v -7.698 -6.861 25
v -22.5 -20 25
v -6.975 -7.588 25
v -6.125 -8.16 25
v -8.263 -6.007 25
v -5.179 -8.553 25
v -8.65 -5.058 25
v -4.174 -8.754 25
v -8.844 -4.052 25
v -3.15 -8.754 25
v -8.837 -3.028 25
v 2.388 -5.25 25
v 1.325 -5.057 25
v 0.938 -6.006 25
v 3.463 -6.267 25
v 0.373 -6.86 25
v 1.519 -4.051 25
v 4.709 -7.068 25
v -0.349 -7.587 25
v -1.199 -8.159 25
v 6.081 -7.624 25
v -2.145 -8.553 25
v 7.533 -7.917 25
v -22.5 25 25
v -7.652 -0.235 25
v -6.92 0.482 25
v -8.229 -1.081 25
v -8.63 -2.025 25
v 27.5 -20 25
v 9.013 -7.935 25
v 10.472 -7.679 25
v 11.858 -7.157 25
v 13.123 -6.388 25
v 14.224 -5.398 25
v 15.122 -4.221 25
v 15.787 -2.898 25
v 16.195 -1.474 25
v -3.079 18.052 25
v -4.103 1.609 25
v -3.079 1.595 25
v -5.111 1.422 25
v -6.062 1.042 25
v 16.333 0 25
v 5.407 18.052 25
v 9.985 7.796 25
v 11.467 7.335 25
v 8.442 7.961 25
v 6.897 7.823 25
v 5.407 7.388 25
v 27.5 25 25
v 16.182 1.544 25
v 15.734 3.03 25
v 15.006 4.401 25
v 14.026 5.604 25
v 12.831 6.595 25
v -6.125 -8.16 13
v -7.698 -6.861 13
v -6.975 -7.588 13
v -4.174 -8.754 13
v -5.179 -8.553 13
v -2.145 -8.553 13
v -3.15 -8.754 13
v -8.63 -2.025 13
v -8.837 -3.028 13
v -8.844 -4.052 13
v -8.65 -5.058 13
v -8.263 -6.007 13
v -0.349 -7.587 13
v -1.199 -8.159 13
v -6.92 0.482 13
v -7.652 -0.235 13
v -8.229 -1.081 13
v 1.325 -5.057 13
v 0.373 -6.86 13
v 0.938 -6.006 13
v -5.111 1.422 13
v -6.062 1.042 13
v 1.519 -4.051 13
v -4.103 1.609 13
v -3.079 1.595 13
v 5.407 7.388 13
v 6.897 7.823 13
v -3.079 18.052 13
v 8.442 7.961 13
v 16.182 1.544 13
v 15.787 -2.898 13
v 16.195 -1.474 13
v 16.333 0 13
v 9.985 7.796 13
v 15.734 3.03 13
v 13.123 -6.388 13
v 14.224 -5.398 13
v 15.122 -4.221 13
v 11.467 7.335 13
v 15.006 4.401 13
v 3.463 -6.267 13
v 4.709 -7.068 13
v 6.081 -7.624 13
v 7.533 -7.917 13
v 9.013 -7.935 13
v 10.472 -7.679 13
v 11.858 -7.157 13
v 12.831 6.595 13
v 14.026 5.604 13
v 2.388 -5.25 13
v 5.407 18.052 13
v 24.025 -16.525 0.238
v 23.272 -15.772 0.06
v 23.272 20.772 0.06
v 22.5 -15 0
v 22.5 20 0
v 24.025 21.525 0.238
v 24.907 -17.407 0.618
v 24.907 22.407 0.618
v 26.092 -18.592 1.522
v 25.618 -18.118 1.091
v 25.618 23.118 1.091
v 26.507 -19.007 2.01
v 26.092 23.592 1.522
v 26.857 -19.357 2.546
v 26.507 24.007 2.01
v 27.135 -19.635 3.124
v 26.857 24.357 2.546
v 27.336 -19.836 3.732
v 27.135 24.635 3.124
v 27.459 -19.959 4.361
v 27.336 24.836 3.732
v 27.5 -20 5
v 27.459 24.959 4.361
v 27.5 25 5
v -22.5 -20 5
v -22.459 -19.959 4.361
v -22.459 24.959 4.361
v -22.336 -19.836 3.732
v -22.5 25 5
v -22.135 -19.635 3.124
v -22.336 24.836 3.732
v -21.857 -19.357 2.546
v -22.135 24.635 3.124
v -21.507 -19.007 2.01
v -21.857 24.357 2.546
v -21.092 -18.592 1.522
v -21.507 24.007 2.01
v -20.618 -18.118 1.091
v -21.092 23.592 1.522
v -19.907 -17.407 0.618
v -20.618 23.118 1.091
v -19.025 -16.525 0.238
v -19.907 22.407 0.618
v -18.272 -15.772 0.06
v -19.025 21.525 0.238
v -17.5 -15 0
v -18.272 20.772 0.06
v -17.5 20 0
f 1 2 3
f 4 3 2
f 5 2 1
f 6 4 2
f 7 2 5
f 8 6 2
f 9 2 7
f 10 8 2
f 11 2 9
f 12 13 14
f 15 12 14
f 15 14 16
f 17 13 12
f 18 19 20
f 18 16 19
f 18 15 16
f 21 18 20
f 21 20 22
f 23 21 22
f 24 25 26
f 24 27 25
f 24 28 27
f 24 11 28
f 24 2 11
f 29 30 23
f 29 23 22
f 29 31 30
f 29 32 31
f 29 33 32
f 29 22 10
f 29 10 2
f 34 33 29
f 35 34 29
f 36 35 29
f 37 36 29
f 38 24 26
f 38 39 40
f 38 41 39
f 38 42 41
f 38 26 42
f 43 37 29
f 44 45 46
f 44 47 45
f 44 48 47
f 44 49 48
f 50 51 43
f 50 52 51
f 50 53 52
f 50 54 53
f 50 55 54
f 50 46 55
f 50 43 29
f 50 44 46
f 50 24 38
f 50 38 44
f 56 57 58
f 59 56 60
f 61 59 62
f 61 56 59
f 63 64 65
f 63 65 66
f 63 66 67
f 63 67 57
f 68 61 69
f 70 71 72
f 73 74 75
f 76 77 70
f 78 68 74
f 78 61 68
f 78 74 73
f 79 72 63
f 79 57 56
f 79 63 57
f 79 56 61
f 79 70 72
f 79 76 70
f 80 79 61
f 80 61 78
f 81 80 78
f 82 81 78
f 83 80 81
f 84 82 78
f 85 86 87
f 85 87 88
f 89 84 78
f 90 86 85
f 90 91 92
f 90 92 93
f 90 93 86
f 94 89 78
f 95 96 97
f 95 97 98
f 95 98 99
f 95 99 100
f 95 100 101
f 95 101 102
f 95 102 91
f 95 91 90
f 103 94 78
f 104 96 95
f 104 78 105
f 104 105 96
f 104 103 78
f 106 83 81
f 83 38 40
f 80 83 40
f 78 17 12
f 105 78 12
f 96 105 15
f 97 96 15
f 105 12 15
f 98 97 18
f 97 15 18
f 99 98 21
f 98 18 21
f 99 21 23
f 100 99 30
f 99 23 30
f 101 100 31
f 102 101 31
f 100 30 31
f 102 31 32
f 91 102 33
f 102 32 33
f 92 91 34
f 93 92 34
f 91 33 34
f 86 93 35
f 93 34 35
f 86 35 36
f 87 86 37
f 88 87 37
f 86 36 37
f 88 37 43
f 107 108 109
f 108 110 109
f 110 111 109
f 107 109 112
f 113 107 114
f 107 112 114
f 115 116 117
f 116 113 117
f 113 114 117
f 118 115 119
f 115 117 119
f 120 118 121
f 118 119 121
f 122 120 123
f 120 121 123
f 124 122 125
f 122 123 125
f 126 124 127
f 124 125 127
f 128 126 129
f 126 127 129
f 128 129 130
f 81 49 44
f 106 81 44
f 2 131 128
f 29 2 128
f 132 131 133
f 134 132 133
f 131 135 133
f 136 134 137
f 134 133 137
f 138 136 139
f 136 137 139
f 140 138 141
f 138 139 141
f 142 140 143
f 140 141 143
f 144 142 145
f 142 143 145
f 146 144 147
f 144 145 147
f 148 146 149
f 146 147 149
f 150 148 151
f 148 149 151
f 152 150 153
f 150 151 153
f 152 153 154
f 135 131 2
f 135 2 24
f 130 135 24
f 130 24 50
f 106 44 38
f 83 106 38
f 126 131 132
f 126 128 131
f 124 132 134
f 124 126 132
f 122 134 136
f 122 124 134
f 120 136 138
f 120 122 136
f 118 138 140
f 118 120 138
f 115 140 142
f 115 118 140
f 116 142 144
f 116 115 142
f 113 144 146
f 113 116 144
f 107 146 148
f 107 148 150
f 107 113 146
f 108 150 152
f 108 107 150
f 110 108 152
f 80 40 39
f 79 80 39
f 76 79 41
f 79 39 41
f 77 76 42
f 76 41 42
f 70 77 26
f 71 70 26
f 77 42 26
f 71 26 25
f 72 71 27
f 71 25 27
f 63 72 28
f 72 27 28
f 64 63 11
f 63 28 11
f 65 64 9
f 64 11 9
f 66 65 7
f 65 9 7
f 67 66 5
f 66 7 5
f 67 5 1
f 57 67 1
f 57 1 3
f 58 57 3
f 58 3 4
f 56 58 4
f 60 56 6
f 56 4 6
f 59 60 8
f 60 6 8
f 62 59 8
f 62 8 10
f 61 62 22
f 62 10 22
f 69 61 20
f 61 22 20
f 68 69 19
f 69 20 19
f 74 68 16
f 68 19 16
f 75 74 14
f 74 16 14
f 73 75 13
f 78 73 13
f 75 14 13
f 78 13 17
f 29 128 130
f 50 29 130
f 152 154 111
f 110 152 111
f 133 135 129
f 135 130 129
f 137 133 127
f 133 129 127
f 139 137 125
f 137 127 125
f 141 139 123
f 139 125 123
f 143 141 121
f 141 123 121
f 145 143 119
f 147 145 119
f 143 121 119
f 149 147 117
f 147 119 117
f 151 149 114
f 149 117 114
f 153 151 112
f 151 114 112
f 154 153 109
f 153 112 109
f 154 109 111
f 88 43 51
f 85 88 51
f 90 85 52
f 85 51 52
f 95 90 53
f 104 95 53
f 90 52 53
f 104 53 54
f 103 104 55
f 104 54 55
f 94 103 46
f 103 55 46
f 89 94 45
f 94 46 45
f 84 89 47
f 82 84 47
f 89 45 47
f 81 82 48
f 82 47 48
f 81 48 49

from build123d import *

# Parameters (mm, degrees)
F0_W     = 50
F0_H     = 45
F1_DEPTH = 25
F3_DEPTH = 12
F4_R     = 5


with BuildPart() as f1:
    # F0 (on Top) → F1 (new body)
    with BuildSketch(Plane.XY):
        with Locations((2.5, 2.5)):
            Rectangle(F0_W, F0_H)
    extrude(amount=F1_DEPTH)

    # F2 (on face) → F3 (cut)
    with BuildSketch(Plane.XY.offset(25)):
        with BuildLine():
            ThreePointArc((1.5188633246, -4.0508734179), (1.5351749633, -3.8134761459), (1.5406159691, -3.5755813587))
            ThreePointArc((1.5406159691, -3.5755813587), (1.2521629282, -1.8671692612), (0.4187848362, -0.3481702463))
            ThreePointArc((0.4187848362, -0.3481702463), (0.7408484381, -2.2672537264), (1.5188633246, -4.0508734179))
        make_face()
        with BuildLine():
            ThreePointArc((0.4187848362, -0.3481702463), (1.2521629282, -1.8671692612), (1.5406159691, -3.5755813587))
            ThreePointArc((1.5406159691, -3.5755813587), (1.5351749633, -3.8134761459), (1.5188633246, -4.0508734179))
            ThreePointArc((1.5188633246, -4.0508734179), (10.4718881616, -7.6790094348), (16.3330176423, 0))
            ThreePointArc((16.3330176423, 0), (12.8314237876, 6.5947473606), (5.4069776088, 7.3881269744))
            Line((5.4069776088, 7.3881269744), (5.4069776088, 1.5949606824))
            Line((5.4069776088, 1.5949606824), (0.5725780424, 1.5949606824))
            ThreePointArc((0.5725780424, 1.5949606824), (0.4359857319, 0.628119961), (0.4187848362, -0.3481702463))
        make_face()
        with BuildLine():
            ThreePointArc((1.5188633246, -4.0508734179), (0.7408484381, -2.2672537264), (0.4187848362, -0.3481702463))
            ThreePointArc((0.4187848362, -0.3481702463), (-1.1358159194, 0.9730272564), (-3.078892131, 1.5949606824))
            ThreePointArc((-3.078892131, 1.5949606824), (-7.6975474715, -6.8613357478), (1.5188633246, -4.0508734179))
        make_face()
        with BuildLine():
            ThreePointArc((-3.078892131, 1.5949606824), (-1.1358159194, 0.9730272564), (0.4187848362, -0.3481702463))
            ThreePointArc((0.4187848362, -0.3481702463), (0.4359857319, 0.628119961), (0.5725780424, 1.5949606824))
            Line((0.5725780424, 1.5949606824), (-3.078892131, 1.5949606824))
        make_face()
        with BuildLine():
            Line((-3.078892131, 18.0523265153), (-3.078892131, 1.5949606824))
            Line((-3.078892131, 1.5949606824), (0.5725780424, 1.5949606824))
            ThreePointArc((0.5725780424, 1.5949606824), (2.2598502763, 5.1006686576), (5.4069776088, 7.3881269744))
            Line((5.4069776088, 7.3881269744), (5.4069776088, 18.0523265153))
            Line((5.4069776088, 18.0523265153), (-3.078892131, 18.0523265153))
        make_face()
        with BuildLine():
            ThreePointArc((5.4069776088, 7.3881269744), (2.2598502763, 5.1006686576), (0.5725780424, 1.5949606824))
            Line((0.5725780424, 1.5949606824), (5.4069776088, 1.5949606824))
            Line((5.4069776088, 1.5949606824), (5.4069776088, 7.3881269744))
        make_face()
    extrude(amount=-F3_DEPTH, mode=Mode.SUBTRACT)

    # F4
    f4_edges = [f1.edges().sort_by_distance(p)[0] for p in [
        (-22.5, 2.5, 0),
        (2.5, 25, 0),
        (2.5, -20, 0),
        (27.5, 2.5, 0),
    ]]
    fillet(f4_edges, radius=F4_R)


solid = f1.part
